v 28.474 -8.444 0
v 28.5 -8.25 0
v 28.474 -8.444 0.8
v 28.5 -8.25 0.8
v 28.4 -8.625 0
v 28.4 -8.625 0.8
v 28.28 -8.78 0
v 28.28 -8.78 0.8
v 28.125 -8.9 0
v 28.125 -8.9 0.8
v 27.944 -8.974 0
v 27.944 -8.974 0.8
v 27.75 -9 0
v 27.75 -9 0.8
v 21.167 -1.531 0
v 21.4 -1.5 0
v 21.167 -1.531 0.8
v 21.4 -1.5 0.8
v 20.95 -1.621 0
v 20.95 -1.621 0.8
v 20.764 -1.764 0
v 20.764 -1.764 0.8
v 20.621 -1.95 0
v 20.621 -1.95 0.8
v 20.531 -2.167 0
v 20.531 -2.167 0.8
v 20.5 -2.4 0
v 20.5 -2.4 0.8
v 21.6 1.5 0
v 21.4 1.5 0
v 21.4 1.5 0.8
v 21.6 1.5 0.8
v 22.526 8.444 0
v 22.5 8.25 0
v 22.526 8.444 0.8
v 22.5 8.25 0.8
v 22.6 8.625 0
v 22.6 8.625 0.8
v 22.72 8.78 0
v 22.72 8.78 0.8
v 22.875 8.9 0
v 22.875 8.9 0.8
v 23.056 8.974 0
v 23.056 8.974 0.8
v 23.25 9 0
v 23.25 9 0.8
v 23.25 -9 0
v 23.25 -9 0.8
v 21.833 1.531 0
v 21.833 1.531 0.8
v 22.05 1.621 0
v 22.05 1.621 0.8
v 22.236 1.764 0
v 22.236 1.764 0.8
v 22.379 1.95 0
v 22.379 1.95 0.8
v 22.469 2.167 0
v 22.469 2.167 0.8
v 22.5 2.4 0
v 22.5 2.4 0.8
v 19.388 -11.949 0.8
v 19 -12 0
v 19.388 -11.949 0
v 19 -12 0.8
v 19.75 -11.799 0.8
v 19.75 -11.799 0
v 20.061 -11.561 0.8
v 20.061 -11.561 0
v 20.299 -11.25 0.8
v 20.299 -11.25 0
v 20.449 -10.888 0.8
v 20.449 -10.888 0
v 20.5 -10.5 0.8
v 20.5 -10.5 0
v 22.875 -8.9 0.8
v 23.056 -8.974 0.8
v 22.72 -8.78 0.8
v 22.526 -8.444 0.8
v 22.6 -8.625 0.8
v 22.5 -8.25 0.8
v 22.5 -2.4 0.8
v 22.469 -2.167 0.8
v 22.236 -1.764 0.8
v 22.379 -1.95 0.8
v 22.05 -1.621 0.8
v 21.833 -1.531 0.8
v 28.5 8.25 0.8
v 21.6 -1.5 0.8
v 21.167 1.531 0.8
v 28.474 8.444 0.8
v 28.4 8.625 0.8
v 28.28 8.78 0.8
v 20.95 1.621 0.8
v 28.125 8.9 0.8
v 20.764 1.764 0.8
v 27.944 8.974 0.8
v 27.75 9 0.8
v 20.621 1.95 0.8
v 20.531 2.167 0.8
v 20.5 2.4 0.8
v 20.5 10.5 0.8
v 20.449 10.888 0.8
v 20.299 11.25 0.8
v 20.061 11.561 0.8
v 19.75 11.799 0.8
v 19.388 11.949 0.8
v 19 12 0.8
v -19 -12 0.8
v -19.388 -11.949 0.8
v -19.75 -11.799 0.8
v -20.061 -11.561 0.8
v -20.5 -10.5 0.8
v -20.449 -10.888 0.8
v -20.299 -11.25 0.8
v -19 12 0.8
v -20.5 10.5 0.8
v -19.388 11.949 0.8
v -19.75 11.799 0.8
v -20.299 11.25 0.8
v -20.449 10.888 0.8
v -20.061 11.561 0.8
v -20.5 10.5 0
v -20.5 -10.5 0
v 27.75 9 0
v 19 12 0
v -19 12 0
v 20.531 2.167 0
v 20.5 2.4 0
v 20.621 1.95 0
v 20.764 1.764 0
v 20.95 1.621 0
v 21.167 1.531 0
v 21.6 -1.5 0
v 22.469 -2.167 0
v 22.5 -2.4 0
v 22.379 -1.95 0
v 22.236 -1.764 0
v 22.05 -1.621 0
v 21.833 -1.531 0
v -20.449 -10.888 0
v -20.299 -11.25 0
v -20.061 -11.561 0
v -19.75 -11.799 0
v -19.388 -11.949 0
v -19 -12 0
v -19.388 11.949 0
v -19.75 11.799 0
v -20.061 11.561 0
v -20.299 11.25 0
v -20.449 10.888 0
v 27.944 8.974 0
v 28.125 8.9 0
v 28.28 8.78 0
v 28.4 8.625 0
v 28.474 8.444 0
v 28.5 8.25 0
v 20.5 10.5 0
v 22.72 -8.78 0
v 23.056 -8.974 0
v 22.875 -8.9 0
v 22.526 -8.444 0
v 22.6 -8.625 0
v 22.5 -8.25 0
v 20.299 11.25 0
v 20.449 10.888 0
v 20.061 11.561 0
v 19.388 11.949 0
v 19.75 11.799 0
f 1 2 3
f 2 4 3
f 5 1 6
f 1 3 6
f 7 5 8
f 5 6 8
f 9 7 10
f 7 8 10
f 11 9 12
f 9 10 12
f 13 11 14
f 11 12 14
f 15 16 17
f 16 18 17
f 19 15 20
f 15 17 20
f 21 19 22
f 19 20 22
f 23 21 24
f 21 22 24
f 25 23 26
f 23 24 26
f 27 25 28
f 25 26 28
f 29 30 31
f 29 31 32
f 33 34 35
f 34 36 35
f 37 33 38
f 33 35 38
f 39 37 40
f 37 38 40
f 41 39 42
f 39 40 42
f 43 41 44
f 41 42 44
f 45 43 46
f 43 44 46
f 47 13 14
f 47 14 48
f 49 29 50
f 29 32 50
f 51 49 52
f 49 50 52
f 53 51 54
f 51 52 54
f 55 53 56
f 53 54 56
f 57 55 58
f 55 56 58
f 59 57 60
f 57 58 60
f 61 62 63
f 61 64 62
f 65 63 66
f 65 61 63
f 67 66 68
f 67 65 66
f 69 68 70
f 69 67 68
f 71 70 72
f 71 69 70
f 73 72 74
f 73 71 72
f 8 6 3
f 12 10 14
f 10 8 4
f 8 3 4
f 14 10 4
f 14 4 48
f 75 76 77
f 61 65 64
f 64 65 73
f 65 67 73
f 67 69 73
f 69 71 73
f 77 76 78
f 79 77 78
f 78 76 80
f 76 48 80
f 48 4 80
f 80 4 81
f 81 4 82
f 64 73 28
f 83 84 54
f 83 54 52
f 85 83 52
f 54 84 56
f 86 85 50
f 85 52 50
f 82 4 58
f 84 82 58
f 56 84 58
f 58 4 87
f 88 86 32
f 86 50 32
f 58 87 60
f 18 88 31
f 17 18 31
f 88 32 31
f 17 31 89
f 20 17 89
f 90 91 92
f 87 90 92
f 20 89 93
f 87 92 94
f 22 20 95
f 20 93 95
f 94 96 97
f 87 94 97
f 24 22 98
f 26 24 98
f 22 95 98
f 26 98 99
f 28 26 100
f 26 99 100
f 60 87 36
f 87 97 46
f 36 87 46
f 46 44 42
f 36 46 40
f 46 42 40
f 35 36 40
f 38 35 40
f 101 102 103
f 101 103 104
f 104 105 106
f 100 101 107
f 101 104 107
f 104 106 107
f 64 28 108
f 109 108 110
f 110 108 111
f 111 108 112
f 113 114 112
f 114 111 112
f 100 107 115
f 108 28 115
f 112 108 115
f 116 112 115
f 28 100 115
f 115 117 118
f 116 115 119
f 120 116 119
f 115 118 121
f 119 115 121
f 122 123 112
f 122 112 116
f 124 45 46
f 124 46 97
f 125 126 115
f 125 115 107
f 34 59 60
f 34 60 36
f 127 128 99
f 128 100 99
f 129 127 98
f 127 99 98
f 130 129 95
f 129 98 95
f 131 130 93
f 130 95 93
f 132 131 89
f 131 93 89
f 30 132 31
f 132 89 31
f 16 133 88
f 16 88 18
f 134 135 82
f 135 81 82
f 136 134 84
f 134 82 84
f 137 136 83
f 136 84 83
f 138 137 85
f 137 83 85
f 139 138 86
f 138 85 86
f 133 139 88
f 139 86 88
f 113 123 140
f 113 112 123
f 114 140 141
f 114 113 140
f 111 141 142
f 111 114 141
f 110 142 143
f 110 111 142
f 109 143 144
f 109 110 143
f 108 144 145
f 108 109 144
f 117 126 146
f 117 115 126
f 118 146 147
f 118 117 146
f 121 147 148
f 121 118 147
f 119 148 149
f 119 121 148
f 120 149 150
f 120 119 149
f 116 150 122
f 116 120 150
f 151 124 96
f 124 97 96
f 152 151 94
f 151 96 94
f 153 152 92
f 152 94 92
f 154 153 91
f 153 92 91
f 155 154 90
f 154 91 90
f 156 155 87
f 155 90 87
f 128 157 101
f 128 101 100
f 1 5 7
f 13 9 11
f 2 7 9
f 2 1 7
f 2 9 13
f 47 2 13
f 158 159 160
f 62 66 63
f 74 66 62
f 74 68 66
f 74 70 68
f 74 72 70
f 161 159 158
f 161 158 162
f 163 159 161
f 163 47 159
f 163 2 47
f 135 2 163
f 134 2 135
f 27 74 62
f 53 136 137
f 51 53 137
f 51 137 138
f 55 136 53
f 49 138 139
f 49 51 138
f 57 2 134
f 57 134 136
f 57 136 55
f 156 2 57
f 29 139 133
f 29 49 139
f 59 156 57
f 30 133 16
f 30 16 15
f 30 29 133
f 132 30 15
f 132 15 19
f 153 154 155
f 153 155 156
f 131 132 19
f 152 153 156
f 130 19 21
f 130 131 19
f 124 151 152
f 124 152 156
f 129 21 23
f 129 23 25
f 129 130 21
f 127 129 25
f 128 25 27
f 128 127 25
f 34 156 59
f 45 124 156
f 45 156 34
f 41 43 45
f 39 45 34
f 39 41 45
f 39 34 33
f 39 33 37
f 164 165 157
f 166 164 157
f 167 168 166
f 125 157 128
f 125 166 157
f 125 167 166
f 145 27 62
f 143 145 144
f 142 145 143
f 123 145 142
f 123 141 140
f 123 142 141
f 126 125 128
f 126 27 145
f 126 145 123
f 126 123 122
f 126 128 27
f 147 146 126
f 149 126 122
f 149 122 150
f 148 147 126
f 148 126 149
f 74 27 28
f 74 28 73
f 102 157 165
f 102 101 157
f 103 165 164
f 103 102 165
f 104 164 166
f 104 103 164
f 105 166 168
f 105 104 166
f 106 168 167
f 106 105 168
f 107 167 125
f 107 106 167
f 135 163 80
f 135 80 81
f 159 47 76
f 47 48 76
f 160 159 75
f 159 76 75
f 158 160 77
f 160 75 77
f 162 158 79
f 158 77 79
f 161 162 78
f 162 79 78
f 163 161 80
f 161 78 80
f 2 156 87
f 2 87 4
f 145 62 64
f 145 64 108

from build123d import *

# Parameters (mm, degrees)
PAD_DEPTH   = 0.8
FILLET_R    = 0.9
FILLET001_R = 0.75
FILLET002_R = 1.5


with BuildPart() as part:
    # Sketch → Pad (new body)
    with BuildSketch(Plane.XY):
        Polygon((-20.5, 12), (20.5, 12), (20.5, 1.5), (22.5, 1.5), (22.5, 9), (28.5, 9), (28.5, -9), (22.5, -9), (22.5, -1.5), (20.5, -1.5), (20.5, -12), (-20.5, -12), align=None)
    extrude(amount=PAD_DEPTH)

    # Fillet
    fillet_edges = [part.edges().sort_by_distance(p)[0] for p in [
        (22.5, -1.5, 0.4),
        (22.5, 1.5, 0.4),
        (20.5, 1.5, 0.4),
        (20.5, -1.5, 0.4),
    ]]
    fillet(fillet_edges, radius=FILLET_R)

    # Fillet001
    fillet001_edges = [part.edges().sort_by_distance(p)[0] for p in [
        (22.5, -9, 0.4),
        (28.5, -9, 0.4),
        (28.5, 9, 0.4),
        (22.5, 9, 0.4),
    ]]
    fillet(fillet001_edges, radius=FILLET001_R)

    # Fillet002
    fillet002_edges = [part.edges().sort_by_distance(p)[0] for p in [
        (20.5, -12, 0.4),
        (-20.5, -12, 0.4),
        (-20.5, 12, 0.4),
        (20.5, 12, 0.4),
    ]]
    fillet(fillet002_edges, radius=FILLET002_R)


solid = part.part
